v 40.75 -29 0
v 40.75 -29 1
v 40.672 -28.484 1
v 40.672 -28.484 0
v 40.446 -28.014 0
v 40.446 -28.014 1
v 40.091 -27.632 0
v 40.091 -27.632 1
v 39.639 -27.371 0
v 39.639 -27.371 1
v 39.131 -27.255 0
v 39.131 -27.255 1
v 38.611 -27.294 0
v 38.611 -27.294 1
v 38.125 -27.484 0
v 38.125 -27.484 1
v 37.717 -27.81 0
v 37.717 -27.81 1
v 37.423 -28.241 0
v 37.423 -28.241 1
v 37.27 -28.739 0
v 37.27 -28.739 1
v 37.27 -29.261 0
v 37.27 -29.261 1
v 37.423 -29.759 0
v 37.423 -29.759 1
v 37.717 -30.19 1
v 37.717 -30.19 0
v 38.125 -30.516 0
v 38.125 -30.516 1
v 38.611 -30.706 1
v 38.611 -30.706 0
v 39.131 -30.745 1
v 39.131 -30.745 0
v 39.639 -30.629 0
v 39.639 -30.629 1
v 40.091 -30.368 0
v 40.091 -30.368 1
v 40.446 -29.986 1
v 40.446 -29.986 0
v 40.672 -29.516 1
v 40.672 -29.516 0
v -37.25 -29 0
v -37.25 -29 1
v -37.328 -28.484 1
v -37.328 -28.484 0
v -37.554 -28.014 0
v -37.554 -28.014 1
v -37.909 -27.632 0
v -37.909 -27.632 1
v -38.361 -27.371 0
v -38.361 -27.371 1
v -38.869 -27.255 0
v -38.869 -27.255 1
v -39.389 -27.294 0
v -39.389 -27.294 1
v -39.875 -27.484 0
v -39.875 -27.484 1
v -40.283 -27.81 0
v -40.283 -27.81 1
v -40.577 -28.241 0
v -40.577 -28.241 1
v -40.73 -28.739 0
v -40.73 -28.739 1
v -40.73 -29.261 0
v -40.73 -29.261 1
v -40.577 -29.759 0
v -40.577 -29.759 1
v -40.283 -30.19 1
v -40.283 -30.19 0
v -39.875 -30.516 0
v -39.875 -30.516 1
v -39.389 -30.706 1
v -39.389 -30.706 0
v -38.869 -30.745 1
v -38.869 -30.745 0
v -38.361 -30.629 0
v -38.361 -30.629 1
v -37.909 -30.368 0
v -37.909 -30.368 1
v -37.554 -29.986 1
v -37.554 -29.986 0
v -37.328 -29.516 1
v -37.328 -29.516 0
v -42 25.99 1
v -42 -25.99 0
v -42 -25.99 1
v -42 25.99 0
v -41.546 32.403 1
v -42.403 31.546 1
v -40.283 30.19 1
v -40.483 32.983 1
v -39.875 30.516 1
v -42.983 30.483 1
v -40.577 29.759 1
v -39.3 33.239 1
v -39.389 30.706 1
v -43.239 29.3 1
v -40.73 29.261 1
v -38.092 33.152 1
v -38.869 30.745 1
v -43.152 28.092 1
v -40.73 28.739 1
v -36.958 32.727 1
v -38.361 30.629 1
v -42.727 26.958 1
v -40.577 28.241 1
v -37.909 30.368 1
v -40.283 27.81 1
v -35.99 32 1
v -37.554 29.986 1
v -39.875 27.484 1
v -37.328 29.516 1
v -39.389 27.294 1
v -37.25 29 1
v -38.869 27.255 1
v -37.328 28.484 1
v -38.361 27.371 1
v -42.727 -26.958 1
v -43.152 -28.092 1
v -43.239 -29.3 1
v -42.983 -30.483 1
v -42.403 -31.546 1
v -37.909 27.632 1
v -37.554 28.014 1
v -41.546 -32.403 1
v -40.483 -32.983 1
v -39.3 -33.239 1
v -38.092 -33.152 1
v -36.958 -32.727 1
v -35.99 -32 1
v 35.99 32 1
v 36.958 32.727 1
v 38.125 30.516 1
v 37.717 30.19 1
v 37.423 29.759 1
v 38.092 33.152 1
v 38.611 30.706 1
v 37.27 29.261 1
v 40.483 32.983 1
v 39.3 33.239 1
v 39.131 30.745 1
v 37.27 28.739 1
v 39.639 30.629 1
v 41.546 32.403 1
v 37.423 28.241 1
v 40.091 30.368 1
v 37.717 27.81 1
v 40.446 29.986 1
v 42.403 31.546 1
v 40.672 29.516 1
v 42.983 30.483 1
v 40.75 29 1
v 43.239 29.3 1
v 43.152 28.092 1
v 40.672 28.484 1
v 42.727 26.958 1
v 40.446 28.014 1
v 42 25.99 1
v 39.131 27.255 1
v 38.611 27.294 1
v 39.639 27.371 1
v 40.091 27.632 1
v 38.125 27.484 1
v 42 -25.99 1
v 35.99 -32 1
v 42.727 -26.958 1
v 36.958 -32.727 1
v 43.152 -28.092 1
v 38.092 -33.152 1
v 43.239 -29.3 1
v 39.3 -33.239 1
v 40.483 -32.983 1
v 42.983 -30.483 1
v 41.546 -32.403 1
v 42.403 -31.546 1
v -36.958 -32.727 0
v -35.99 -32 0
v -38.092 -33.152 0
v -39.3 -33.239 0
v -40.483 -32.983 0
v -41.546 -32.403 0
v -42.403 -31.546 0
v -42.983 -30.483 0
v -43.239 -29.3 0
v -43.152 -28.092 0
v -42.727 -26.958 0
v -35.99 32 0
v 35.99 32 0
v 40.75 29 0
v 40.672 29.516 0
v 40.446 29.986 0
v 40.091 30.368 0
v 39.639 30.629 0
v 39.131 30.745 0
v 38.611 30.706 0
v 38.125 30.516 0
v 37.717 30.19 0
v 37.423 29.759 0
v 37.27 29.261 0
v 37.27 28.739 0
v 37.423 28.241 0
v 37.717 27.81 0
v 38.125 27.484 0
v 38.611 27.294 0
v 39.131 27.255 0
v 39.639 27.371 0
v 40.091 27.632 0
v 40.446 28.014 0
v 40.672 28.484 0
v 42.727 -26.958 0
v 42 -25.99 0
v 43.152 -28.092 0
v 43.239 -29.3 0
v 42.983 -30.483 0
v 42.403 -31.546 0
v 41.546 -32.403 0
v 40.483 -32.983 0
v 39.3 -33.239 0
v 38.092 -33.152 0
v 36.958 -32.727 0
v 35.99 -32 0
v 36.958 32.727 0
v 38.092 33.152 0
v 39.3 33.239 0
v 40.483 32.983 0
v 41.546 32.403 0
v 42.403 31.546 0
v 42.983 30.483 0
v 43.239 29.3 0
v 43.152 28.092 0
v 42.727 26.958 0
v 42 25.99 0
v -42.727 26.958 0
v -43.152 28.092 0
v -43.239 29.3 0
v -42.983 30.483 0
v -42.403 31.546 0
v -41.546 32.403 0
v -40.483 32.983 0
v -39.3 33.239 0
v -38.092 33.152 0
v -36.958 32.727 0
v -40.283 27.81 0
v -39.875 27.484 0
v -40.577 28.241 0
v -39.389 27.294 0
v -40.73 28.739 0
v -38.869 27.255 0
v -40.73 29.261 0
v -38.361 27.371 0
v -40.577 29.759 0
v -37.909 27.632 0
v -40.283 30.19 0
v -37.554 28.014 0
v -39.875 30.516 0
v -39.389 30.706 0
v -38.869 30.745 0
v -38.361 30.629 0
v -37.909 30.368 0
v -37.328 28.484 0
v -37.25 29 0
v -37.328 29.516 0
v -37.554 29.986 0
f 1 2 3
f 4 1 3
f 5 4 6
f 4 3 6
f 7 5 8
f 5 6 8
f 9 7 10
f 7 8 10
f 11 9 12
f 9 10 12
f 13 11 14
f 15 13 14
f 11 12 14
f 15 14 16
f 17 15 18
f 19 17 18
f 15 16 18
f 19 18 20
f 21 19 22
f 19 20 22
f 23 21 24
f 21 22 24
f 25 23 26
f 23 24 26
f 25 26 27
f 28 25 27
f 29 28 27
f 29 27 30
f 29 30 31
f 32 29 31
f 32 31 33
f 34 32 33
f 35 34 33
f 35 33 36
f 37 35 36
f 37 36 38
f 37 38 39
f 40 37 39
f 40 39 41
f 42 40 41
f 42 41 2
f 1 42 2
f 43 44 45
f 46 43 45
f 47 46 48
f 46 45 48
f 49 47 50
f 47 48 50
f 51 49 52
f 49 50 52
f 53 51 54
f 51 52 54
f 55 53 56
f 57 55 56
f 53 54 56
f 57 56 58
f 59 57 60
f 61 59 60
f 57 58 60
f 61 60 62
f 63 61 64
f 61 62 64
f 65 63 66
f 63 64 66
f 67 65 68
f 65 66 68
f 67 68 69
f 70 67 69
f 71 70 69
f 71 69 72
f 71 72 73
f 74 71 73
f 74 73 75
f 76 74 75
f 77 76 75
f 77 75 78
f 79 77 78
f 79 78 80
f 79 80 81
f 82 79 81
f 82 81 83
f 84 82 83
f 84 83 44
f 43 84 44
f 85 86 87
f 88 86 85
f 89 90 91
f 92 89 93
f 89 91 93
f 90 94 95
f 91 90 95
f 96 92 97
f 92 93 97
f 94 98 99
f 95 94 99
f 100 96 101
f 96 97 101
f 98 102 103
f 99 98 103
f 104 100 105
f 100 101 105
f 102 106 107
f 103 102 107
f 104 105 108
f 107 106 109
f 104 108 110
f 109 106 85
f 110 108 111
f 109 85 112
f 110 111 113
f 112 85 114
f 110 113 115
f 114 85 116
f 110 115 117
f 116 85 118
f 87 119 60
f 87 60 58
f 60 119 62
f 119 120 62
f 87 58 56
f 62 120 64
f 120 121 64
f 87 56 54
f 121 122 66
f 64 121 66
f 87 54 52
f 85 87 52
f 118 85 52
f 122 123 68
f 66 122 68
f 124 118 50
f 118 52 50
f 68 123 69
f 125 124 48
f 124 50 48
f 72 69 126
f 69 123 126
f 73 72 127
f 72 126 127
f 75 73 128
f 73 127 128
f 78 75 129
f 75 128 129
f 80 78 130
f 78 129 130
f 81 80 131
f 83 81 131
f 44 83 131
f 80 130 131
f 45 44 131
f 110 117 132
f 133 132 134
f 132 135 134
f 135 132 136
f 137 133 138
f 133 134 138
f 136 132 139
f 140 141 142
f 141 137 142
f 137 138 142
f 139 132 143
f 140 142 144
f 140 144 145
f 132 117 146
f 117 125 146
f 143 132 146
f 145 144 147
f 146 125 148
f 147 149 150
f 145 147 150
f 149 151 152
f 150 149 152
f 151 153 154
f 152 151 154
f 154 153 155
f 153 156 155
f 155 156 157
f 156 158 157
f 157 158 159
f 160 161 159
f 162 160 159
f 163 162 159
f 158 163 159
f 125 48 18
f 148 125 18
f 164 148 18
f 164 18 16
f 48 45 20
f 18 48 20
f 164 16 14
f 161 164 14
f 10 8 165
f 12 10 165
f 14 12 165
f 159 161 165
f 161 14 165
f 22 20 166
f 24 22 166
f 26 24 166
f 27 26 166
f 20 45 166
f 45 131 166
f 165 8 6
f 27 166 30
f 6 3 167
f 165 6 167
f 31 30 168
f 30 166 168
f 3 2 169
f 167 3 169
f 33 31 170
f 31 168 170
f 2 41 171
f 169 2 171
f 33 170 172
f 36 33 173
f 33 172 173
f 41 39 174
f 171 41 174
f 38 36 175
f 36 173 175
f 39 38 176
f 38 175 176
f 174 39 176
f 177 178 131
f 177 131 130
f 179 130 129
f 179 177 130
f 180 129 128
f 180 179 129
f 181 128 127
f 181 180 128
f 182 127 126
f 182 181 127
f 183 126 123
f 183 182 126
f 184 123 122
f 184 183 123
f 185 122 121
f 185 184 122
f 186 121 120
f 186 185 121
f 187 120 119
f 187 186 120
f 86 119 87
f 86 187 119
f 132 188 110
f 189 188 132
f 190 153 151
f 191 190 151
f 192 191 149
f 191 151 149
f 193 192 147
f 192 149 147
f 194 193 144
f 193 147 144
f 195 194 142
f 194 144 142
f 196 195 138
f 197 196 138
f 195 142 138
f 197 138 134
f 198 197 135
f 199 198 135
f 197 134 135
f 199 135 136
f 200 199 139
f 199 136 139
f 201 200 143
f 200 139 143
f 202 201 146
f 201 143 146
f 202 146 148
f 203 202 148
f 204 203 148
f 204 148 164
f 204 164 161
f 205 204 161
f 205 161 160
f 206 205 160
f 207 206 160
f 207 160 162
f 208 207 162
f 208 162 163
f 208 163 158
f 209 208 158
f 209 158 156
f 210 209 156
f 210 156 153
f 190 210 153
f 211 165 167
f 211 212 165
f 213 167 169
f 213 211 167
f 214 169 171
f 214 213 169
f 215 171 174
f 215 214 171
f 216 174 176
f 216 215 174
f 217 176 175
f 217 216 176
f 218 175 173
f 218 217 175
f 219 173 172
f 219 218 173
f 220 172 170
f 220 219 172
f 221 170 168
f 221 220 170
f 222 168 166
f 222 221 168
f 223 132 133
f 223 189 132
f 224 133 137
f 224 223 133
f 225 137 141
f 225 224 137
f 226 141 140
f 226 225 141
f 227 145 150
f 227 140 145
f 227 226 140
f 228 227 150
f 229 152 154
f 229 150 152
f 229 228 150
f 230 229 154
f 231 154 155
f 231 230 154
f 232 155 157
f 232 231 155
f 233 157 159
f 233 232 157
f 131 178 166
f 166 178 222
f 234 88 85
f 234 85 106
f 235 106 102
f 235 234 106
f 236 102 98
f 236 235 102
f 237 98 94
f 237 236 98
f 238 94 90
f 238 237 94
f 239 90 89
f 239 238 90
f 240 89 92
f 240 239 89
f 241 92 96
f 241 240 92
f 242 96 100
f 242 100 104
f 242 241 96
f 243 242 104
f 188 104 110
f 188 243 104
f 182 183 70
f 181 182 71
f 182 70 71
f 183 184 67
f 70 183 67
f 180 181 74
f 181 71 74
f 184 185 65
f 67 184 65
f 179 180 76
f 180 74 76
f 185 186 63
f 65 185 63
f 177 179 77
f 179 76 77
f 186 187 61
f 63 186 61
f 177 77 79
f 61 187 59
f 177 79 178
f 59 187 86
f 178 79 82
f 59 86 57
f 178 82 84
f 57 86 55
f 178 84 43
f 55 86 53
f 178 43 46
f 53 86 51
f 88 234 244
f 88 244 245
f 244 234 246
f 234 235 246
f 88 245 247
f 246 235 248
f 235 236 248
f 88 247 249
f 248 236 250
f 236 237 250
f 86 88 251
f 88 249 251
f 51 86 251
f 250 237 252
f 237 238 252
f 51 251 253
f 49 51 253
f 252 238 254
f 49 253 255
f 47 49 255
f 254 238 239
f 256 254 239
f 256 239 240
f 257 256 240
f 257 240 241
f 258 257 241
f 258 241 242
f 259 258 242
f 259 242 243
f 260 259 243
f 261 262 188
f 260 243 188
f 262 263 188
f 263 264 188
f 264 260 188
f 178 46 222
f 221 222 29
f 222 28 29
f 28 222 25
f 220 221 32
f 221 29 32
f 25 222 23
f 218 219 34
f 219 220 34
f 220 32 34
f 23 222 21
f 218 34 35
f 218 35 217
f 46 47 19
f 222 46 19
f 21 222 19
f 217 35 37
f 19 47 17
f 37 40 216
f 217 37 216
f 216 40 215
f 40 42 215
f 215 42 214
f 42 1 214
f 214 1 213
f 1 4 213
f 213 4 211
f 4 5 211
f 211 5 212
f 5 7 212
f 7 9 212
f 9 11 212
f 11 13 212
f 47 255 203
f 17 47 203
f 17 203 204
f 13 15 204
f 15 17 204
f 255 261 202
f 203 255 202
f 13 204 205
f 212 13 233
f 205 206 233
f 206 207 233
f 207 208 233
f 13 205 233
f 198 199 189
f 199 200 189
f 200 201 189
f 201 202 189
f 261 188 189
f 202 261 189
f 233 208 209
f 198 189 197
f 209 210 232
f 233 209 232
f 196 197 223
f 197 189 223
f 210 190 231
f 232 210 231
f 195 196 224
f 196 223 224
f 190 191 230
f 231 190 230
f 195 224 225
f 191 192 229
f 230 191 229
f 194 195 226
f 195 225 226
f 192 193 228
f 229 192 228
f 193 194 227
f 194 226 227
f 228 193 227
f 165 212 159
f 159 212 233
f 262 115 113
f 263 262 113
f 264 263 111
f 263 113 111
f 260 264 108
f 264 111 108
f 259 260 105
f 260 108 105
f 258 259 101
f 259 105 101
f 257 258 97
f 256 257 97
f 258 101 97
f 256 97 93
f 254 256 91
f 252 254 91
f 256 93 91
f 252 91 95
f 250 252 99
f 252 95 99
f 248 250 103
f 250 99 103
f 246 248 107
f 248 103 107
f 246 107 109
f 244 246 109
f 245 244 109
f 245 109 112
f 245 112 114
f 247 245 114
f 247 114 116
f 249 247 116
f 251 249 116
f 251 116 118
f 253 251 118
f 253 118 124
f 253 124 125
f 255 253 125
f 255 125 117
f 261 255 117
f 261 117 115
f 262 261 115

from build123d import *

# Parameters (mm, degrees)
F0_W     = 84
F0_H     = 64
F1_DEPTH = 1
F2_R     = 4.25
F3_DEPTH = 1
F4_R     = 1.75
F5_DEPTH = 40


with BuildPart() as f1:
    # F0 (on Top) → F1 (new body)
    with BuildSketch(Plane.XY):
        Rectangle(F0_W, F0_H)
    extrude(amount=F1_DEPTH)

    # F2 (on face) → F3 (join)
    with BuildSketch(Plane(origin=(0, 0, 0), x_dir=(1, 0, 0), z_dir=(0, 0, -1))):
        with Locations((-39, 29)):
            Circle(F2_R)
        with Locations((-39, -29)):
            Circle(F2_R)
        with Locations((39, -29)):
            Circle(F2_R)
        with Locations((39, 29)):
            Circle(F2_R)
    extrude(amount=-F3_DEPTH)

    # F4 (on face) → F5 (cut)
    with BuildSketch(Plane.XY.offset(1)):
        with Locations((-39, 29)):
            Circle(F4_R)
        with Locations((39, 29)):
            Circle(F4_R)
        with Locations((-39, -29)):
            Circle(F4_R)
        with Locations((39, -29)):
            Circle(F4_R)
    extrude(amount=-F5_DEPTH, mode=Mode.SUBTRACT)


solid = f1.part
